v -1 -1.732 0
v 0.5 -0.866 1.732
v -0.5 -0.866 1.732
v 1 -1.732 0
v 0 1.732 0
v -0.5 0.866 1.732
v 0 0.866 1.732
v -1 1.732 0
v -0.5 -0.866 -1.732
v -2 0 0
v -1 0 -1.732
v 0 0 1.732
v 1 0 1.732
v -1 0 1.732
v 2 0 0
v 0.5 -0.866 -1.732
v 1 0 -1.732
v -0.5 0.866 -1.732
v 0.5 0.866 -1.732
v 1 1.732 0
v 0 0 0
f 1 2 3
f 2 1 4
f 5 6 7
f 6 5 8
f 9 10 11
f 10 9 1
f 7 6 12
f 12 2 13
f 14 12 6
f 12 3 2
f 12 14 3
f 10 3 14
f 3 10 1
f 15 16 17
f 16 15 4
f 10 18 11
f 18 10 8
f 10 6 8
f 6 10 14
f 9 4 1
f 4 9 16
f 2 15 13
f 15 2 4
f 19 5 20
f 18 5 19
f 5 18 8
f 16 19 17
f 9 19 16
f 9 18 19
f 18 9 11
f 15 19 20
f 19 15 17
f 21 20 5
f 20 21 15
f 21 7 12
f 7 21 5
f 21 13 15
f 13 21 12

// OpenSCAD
$fn = 36*2;

LENGTH    = 156;
WIDTH     =  40;
HEIGHT    =  54;
THICKNESS =   1.5 +.5;

LID_HEIGHT    = 18;
LID_THICKNESS = 3;

PLAY = .2;

module body(outer=false, play=0) {
    intersection() {
        translate([0, HEIGHT, 0])
        rotate([90, 0, 0])
        linear_extrude(height=HEIGHT*2)
        resize([LENGTH, HEIGHT, 1])
        import(file="projection-front.dxf");

        linear_extrude(height=HEIGHT*2)
        resize([LENGTH -play*2, WIDTH -play*2, 1])
        import(file=outer?"projection-top.dxf":"projection-top-thick.dxf");
    }
}

module case(play=0) {
    difference() {
        minkowski() {
            body(outer=true);
            sphere(r=THICKNESS+play, $fn=6);
        }

        body(play=play);

        if(0)
        translate([0, 0, HEIGHT + THICKNESS/2])
        cube([LENGTH*2, WIDTH*2, THICKNESS*2], center=true);
    }
}

module lid() {
    difference() {
        d = THICKNESS * 2;
        minkowski() {
            linear_extrude(height=LID_HEIGHT)
            resize([LENGTH + d*2, WIDTH + d*2, 1])
            import(file="projection-top.dxf");
            
            sphere(d=d, $fn=6);
        }
        
        minkowski() {
            translate([0, 0, -HEIGHT+LID_HEIGHT-LID_THICKNESS])
            case();
            cylinder(r=PLAY, $fn=6, h=.1);
        }

        translate([0, 0, -HEIGHT+LID_HEIGHT-LID_THICKNESS*2])
        body();

        translate([0, 0, -HEIGHT+LID_HEIGHT-LID_THICKNESS - THICKNESS/2])
        resize([LENGTH - 8, WIDTH - 6, HEIGHT])
        body(outer=true);

    }
}


difference() {
    union() {
        case();
        //translate([0, 0, HEIGHT -LID_HEIGHT+LID_THICKNESS +.5]) lid();
    }
    
    //translate([-LENGTH/2, WIDTH/2-2, 0])
    cube(LENGTH);
}
